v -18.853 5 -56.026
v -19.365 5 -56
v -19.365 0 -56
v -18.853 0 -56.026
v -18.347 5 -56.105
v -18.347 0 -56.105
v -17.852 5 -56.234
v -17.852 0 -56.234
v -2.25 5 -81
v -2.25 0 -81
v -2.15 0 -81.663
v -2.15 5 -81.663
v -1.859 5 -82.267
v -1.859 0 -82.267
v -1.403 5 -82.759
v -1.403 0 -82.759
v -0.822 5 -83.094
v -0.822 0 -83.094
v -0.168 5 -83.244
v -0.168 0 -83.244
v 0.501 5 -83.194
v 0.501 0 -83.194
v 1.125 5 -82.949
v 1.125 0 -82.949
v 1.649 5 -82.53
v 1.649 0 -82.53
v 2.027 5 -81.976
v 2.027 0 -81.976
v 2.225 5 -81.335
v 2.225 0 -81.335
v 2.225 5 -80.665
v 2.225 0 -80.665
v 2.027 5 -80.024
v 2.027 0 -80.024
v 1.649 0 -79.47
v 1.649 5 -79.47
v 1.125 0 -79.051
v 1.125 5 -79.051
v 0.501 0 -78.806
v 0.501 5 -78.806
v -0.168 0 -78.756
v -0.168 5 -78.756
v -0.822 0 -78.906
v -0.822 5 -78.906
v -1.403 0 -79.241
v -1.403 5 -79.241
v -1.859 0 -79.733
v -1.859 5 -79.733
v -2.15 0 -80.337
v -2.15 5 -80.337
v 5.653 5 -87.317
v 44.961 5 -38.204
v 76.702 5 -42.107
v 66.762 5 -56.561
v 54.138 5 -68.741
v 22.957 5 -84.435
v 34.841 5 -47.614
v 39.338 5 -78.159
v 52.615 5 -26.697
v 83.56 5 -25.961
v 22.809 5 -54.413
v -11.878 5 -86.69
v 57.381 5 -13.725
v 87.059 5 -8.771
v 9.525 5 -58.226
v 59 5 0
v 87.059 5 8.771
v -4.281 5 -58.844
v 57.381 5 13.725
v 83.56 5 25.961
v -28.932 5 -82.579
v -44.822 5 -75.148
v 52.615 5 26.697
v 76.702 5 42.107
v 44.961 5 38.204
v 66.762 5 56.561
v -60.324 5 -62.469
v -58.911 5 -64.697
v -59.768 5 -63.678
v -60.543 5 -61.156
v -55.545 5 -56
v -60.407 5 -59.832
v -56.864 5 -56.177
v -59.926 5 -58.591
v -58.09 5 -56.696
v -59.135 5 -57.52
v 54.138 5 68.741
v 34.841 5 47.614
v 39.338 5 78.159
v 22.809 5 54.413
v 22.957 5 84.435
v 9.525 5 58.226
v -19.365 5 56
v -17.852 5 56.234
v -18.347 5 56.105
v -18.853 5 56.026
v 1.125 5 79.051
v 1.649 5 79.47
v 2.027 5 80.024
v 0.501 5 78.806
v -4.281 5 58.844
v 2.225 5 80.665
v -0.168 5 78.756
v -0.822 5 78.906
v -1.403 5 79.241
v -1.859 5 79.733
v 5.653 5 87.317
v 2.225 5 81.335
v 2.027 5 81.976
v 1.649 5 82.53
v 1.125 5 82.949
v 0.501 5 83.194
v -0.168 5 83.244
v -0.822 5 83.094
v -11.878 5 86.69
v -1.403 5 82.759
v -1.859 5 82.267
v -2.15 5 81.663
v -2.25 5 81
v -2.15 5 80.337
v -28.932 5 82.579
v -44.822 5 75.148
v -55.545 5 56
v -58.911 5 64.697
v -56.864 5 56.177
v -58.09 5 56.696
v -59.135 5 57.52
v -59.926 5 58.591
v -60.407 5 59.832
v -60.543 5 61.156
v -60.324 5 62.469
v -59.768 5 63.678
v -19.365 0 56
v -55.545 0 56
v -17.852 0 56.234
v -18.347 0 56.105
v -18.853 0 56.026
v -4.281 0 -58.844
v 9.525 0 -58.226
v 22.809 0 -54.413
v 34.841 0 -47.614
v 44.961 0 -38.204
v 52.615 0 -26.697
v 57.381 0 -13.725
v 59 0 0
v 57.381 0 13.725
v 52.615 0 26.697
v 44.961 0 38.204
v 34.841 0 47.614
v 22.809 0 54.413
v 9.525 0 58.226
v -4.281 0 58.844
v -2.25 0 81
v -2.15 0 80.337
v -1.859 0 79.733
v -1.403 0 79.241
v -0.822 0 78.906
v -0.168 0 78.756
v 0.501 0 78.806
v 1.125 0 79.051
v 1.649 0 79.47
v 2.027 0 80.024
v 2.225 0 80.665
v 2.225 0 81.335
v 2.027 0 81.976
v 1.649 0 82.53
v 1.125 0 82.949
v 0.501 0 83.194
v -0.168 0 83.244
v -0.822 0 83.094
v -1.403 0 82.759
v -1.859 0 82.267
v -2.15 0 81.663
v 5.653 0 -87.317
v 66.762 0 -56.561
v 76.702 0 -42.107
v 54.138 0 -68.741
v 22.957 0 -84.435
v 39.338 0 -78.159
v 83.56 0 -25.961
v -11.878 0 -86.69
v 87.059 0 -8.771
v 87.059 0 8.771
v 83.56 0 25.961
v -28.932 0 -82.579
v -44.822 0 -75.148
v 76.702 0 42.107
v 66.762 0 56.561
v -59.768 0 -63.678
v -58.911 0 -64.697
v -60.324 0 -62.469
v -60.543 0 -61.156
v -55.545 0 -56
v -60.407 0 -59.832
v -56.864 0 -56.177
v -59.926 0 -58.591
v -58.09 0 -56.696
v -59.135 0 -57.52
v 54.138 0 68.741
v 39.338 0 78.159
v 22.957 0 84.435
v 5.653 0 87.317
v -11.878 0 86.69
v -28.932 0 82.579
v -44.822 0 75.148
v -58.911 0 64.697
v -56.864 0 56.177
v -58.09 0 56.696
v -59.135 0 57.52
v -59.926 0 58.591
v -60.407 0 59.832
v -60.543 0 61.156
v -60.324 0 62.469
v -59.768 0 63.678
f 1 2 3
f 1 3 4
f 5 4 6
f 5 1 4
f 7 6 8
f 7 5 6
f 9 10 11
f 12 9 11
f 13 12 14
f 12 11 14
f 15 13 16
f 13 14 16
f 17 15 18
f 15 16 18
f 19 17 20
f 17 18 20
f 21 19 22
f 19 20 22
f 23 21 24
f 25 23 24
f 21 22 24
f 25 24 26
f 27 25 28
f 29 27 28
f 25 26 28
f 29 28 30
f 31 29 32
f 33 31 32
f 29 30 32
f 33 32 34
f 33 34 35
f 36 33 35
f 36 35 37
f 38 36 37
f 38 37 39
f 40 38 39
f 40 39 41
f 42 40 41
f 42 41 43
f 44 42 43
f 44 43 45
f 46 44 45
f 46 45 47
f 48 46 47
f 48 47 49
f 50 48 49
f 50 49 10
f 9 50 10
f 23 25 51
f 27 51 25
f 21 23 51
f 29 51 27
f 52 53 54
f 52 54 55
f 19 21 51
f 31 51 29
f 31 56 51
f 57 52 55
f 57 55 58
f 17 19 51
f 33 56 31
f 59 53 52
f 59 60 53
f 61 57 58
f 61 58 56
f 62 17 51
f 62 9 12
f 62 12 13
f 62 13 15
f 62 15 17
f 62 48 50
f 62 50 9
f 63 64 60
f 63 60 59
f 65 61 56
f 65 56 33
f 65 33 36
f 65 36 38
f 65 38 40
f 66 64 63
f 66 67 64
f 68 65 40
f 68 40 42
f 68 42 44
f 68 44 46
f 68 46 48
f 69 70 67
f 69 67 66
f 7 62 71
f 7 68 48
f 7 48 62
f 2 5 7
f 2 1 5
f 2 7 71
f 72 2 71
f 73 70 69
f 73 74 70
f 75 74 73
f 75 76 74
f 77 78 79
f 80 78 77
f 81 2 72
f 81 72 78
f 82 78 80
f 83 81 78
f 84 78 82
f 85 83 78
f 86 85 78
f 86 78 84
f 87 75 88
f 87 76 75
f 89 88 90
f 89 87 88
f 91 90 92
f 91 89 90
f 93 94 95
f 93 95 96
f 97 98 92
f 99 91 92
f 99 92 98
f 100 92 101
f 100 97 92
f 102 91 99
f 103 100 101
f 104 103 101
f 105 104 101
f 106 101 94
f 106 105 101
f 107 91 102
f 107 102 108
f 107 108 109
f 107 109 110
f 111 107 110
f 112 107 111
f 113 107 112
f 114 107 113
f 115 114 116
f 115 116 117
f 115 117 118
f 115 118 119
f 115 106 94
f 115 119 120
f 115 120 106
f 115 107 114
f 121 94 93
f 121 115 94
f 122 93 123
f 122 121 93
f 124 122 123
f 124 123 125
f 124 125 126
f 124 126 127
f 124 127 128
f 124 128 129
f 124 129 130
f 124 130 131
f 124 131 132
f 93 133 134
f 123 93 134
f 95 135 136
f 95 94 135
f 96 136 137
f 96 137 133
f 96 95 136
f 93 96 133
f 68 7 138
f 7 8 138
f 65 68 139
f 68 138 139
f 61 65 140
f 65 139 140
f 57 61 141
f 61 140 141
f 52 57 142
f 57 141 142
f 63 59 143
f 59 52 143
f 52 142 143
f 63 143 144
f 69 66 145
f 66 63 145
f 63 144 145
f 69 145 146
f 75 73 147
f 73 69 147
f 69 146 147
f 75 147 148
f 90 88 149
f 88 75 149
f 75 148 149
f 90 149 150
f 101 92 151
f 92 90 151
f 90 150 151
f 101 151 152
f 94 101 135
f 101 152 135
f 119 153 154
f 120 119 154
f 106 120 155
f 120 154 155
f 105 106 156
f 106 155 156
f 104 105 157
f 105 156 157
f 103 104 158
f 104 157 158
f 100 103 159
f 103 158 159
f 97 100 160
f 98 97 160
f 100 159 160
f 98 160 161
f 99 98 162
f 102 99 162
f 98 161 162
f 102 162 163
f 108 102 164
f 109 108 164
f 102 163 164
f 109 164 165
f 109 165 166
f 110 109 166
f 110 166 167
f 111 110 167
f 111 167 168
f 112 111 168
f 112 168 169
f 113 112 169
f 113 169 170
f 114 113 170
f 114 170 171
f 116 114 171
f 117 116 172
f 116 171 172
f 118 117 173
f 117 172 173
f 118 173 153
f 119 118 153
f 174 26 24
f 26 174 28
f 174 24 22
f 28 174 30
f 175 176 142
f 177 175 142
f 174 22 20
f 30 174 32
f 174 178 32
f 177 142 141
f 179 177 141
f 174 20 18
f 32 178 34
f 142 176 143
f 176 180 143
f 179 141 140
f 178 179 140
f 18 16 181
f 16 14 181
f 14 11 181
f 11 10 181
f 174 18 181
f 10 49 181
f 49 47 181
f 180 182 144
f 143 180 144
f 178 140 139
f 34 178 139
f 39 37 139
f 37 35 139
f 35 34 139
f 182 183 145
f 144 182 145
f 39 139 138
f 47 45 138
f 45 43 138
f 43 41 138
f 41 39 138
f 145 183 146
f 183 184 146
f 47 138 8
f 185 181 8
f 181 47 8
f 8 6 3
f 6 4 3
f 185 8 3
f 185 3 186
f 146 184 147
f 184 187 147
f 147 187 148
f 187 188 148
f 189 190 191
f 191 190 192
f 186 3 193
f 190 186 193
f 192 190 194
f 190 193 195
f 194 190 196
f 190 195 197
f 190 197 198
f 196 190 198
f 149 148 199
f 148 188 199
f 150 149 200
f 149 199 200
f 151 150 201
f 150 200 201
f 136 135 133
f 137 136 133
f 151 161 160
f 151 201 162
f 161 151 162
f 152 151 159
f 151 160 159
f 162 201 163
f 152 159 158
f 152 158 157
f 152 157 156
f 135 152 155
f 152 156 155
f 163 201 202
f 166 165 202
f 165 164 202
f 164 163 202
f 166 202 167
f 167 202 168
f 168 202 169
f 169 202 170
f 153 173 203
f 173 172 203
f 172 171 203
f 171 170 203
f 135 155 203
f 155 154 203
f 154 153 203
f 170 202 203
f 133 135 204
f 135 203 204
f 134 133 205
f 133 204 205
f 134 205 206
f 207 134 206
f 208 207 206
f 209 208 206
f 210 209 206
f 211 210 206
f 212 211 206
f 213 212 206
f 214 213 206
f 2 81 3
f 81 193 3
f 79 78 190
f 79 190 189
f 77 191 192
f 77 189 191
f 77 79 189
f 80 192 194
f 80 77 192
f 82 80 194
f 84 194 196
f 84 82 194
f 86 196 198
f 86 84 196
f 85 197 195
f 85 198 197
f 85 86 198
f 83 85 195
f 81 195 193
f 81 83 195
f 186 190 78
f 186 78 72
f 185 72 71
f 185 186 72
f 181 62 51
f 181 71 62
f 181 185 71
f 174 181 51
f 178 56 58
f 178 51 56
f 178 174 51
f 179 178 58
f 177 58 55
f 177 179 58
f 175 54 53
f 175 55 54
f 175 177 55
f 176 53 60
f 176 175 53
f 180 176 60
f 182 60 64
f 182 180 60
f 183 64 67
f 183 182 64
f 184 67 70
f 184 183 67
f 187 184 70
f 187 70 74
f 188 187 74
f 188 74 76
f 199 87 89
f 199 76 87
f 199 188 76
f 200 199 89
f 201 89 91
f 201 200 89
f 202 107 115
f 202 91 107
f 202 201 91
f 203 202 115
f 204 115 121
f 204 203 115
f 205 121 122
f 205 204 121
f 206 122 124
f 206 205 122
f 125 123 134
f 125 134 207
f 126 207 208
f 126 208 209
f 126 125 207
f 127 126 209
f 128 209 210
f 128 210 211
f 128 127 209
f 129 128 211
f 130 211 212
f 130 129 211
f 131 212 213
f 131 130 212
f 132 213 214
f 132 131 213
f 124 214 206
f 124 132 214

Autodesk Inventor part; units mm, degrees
ref_plane "YZ Plane" through (0, 0, 0) normal (1, 0, 0) x (0, 1, 0)
ref_plane "XZ Plane" through (0, 0, 0) normal (0, 1, 0) x (-1, 0, 0)
ref_plane "XY Plane" through (0, 0, 0) normal (0, 0, 1) x (1, 0, 0)
sketch "Sketch1" plane through (0, 0, 0) normal (0, 1, 0) x (-1, 0, 0)
  circle A0 centre (0, 0) radius 59
  circle A1 centre (0, 0) radius 81
  circle A2 centre (0, 0) radius 87.5
  circle A3 centre (0, 81) radius 2.25
  circle A4 centre (0, -81) radius 2.25
  line L0 (90, -56) -> (15, -56)
  line L1 (10, -51) -> (10, 51)
  line L2 (15, 56) -> (90, 56)
  line L3 (90, 56) -> (90, -56)
  line L4 (90, -56) -> (10, 56) construction
  line L5 (10, -56) -> (90, 56) construction
  arc A5 (10, -51) -> (15, -56) centre (15, -51) ccw
  arc A6 (15, 56) -> (10, 51) centre (15, 51) ccw
  point P0 (50, 0)
  point P1 (90, 0)
  point P2 (10, 0)
  point P3 (60, -54.4151)
  point P4 (60, 54.4151)
  point P5 (80, 35.4436)
  point P6 (80, -35.4436)
  point P7 (67.2328, 56)
  point P8 (67.2328, -56)
  dimension "d0" = 118
  dimension "d1" = 162
  dimension "d2" = 175
  dimension "d3" = 4.5
  dimension "d4" = 4.5
  dimension "d7" = 112
  dimension "d9" = 80
  dimension "d10" = 10
  dimension "d11" = 5
extrude "Extrusion1" add sketch "Sketch1" along normal blind 5 contours A0 L0 A1 A4 A3 L2 | A1 A3 A4 L0 A2 L2
fillet "Fillet1" radius 5 4 edges at (-67.2328, 2.5, -56) (-67.2328, 2.5, 56) (-18.5742, 2.5, -56) (-18.5742, 2.5, 56)
properties part number "Cylinder Segment Holder"
